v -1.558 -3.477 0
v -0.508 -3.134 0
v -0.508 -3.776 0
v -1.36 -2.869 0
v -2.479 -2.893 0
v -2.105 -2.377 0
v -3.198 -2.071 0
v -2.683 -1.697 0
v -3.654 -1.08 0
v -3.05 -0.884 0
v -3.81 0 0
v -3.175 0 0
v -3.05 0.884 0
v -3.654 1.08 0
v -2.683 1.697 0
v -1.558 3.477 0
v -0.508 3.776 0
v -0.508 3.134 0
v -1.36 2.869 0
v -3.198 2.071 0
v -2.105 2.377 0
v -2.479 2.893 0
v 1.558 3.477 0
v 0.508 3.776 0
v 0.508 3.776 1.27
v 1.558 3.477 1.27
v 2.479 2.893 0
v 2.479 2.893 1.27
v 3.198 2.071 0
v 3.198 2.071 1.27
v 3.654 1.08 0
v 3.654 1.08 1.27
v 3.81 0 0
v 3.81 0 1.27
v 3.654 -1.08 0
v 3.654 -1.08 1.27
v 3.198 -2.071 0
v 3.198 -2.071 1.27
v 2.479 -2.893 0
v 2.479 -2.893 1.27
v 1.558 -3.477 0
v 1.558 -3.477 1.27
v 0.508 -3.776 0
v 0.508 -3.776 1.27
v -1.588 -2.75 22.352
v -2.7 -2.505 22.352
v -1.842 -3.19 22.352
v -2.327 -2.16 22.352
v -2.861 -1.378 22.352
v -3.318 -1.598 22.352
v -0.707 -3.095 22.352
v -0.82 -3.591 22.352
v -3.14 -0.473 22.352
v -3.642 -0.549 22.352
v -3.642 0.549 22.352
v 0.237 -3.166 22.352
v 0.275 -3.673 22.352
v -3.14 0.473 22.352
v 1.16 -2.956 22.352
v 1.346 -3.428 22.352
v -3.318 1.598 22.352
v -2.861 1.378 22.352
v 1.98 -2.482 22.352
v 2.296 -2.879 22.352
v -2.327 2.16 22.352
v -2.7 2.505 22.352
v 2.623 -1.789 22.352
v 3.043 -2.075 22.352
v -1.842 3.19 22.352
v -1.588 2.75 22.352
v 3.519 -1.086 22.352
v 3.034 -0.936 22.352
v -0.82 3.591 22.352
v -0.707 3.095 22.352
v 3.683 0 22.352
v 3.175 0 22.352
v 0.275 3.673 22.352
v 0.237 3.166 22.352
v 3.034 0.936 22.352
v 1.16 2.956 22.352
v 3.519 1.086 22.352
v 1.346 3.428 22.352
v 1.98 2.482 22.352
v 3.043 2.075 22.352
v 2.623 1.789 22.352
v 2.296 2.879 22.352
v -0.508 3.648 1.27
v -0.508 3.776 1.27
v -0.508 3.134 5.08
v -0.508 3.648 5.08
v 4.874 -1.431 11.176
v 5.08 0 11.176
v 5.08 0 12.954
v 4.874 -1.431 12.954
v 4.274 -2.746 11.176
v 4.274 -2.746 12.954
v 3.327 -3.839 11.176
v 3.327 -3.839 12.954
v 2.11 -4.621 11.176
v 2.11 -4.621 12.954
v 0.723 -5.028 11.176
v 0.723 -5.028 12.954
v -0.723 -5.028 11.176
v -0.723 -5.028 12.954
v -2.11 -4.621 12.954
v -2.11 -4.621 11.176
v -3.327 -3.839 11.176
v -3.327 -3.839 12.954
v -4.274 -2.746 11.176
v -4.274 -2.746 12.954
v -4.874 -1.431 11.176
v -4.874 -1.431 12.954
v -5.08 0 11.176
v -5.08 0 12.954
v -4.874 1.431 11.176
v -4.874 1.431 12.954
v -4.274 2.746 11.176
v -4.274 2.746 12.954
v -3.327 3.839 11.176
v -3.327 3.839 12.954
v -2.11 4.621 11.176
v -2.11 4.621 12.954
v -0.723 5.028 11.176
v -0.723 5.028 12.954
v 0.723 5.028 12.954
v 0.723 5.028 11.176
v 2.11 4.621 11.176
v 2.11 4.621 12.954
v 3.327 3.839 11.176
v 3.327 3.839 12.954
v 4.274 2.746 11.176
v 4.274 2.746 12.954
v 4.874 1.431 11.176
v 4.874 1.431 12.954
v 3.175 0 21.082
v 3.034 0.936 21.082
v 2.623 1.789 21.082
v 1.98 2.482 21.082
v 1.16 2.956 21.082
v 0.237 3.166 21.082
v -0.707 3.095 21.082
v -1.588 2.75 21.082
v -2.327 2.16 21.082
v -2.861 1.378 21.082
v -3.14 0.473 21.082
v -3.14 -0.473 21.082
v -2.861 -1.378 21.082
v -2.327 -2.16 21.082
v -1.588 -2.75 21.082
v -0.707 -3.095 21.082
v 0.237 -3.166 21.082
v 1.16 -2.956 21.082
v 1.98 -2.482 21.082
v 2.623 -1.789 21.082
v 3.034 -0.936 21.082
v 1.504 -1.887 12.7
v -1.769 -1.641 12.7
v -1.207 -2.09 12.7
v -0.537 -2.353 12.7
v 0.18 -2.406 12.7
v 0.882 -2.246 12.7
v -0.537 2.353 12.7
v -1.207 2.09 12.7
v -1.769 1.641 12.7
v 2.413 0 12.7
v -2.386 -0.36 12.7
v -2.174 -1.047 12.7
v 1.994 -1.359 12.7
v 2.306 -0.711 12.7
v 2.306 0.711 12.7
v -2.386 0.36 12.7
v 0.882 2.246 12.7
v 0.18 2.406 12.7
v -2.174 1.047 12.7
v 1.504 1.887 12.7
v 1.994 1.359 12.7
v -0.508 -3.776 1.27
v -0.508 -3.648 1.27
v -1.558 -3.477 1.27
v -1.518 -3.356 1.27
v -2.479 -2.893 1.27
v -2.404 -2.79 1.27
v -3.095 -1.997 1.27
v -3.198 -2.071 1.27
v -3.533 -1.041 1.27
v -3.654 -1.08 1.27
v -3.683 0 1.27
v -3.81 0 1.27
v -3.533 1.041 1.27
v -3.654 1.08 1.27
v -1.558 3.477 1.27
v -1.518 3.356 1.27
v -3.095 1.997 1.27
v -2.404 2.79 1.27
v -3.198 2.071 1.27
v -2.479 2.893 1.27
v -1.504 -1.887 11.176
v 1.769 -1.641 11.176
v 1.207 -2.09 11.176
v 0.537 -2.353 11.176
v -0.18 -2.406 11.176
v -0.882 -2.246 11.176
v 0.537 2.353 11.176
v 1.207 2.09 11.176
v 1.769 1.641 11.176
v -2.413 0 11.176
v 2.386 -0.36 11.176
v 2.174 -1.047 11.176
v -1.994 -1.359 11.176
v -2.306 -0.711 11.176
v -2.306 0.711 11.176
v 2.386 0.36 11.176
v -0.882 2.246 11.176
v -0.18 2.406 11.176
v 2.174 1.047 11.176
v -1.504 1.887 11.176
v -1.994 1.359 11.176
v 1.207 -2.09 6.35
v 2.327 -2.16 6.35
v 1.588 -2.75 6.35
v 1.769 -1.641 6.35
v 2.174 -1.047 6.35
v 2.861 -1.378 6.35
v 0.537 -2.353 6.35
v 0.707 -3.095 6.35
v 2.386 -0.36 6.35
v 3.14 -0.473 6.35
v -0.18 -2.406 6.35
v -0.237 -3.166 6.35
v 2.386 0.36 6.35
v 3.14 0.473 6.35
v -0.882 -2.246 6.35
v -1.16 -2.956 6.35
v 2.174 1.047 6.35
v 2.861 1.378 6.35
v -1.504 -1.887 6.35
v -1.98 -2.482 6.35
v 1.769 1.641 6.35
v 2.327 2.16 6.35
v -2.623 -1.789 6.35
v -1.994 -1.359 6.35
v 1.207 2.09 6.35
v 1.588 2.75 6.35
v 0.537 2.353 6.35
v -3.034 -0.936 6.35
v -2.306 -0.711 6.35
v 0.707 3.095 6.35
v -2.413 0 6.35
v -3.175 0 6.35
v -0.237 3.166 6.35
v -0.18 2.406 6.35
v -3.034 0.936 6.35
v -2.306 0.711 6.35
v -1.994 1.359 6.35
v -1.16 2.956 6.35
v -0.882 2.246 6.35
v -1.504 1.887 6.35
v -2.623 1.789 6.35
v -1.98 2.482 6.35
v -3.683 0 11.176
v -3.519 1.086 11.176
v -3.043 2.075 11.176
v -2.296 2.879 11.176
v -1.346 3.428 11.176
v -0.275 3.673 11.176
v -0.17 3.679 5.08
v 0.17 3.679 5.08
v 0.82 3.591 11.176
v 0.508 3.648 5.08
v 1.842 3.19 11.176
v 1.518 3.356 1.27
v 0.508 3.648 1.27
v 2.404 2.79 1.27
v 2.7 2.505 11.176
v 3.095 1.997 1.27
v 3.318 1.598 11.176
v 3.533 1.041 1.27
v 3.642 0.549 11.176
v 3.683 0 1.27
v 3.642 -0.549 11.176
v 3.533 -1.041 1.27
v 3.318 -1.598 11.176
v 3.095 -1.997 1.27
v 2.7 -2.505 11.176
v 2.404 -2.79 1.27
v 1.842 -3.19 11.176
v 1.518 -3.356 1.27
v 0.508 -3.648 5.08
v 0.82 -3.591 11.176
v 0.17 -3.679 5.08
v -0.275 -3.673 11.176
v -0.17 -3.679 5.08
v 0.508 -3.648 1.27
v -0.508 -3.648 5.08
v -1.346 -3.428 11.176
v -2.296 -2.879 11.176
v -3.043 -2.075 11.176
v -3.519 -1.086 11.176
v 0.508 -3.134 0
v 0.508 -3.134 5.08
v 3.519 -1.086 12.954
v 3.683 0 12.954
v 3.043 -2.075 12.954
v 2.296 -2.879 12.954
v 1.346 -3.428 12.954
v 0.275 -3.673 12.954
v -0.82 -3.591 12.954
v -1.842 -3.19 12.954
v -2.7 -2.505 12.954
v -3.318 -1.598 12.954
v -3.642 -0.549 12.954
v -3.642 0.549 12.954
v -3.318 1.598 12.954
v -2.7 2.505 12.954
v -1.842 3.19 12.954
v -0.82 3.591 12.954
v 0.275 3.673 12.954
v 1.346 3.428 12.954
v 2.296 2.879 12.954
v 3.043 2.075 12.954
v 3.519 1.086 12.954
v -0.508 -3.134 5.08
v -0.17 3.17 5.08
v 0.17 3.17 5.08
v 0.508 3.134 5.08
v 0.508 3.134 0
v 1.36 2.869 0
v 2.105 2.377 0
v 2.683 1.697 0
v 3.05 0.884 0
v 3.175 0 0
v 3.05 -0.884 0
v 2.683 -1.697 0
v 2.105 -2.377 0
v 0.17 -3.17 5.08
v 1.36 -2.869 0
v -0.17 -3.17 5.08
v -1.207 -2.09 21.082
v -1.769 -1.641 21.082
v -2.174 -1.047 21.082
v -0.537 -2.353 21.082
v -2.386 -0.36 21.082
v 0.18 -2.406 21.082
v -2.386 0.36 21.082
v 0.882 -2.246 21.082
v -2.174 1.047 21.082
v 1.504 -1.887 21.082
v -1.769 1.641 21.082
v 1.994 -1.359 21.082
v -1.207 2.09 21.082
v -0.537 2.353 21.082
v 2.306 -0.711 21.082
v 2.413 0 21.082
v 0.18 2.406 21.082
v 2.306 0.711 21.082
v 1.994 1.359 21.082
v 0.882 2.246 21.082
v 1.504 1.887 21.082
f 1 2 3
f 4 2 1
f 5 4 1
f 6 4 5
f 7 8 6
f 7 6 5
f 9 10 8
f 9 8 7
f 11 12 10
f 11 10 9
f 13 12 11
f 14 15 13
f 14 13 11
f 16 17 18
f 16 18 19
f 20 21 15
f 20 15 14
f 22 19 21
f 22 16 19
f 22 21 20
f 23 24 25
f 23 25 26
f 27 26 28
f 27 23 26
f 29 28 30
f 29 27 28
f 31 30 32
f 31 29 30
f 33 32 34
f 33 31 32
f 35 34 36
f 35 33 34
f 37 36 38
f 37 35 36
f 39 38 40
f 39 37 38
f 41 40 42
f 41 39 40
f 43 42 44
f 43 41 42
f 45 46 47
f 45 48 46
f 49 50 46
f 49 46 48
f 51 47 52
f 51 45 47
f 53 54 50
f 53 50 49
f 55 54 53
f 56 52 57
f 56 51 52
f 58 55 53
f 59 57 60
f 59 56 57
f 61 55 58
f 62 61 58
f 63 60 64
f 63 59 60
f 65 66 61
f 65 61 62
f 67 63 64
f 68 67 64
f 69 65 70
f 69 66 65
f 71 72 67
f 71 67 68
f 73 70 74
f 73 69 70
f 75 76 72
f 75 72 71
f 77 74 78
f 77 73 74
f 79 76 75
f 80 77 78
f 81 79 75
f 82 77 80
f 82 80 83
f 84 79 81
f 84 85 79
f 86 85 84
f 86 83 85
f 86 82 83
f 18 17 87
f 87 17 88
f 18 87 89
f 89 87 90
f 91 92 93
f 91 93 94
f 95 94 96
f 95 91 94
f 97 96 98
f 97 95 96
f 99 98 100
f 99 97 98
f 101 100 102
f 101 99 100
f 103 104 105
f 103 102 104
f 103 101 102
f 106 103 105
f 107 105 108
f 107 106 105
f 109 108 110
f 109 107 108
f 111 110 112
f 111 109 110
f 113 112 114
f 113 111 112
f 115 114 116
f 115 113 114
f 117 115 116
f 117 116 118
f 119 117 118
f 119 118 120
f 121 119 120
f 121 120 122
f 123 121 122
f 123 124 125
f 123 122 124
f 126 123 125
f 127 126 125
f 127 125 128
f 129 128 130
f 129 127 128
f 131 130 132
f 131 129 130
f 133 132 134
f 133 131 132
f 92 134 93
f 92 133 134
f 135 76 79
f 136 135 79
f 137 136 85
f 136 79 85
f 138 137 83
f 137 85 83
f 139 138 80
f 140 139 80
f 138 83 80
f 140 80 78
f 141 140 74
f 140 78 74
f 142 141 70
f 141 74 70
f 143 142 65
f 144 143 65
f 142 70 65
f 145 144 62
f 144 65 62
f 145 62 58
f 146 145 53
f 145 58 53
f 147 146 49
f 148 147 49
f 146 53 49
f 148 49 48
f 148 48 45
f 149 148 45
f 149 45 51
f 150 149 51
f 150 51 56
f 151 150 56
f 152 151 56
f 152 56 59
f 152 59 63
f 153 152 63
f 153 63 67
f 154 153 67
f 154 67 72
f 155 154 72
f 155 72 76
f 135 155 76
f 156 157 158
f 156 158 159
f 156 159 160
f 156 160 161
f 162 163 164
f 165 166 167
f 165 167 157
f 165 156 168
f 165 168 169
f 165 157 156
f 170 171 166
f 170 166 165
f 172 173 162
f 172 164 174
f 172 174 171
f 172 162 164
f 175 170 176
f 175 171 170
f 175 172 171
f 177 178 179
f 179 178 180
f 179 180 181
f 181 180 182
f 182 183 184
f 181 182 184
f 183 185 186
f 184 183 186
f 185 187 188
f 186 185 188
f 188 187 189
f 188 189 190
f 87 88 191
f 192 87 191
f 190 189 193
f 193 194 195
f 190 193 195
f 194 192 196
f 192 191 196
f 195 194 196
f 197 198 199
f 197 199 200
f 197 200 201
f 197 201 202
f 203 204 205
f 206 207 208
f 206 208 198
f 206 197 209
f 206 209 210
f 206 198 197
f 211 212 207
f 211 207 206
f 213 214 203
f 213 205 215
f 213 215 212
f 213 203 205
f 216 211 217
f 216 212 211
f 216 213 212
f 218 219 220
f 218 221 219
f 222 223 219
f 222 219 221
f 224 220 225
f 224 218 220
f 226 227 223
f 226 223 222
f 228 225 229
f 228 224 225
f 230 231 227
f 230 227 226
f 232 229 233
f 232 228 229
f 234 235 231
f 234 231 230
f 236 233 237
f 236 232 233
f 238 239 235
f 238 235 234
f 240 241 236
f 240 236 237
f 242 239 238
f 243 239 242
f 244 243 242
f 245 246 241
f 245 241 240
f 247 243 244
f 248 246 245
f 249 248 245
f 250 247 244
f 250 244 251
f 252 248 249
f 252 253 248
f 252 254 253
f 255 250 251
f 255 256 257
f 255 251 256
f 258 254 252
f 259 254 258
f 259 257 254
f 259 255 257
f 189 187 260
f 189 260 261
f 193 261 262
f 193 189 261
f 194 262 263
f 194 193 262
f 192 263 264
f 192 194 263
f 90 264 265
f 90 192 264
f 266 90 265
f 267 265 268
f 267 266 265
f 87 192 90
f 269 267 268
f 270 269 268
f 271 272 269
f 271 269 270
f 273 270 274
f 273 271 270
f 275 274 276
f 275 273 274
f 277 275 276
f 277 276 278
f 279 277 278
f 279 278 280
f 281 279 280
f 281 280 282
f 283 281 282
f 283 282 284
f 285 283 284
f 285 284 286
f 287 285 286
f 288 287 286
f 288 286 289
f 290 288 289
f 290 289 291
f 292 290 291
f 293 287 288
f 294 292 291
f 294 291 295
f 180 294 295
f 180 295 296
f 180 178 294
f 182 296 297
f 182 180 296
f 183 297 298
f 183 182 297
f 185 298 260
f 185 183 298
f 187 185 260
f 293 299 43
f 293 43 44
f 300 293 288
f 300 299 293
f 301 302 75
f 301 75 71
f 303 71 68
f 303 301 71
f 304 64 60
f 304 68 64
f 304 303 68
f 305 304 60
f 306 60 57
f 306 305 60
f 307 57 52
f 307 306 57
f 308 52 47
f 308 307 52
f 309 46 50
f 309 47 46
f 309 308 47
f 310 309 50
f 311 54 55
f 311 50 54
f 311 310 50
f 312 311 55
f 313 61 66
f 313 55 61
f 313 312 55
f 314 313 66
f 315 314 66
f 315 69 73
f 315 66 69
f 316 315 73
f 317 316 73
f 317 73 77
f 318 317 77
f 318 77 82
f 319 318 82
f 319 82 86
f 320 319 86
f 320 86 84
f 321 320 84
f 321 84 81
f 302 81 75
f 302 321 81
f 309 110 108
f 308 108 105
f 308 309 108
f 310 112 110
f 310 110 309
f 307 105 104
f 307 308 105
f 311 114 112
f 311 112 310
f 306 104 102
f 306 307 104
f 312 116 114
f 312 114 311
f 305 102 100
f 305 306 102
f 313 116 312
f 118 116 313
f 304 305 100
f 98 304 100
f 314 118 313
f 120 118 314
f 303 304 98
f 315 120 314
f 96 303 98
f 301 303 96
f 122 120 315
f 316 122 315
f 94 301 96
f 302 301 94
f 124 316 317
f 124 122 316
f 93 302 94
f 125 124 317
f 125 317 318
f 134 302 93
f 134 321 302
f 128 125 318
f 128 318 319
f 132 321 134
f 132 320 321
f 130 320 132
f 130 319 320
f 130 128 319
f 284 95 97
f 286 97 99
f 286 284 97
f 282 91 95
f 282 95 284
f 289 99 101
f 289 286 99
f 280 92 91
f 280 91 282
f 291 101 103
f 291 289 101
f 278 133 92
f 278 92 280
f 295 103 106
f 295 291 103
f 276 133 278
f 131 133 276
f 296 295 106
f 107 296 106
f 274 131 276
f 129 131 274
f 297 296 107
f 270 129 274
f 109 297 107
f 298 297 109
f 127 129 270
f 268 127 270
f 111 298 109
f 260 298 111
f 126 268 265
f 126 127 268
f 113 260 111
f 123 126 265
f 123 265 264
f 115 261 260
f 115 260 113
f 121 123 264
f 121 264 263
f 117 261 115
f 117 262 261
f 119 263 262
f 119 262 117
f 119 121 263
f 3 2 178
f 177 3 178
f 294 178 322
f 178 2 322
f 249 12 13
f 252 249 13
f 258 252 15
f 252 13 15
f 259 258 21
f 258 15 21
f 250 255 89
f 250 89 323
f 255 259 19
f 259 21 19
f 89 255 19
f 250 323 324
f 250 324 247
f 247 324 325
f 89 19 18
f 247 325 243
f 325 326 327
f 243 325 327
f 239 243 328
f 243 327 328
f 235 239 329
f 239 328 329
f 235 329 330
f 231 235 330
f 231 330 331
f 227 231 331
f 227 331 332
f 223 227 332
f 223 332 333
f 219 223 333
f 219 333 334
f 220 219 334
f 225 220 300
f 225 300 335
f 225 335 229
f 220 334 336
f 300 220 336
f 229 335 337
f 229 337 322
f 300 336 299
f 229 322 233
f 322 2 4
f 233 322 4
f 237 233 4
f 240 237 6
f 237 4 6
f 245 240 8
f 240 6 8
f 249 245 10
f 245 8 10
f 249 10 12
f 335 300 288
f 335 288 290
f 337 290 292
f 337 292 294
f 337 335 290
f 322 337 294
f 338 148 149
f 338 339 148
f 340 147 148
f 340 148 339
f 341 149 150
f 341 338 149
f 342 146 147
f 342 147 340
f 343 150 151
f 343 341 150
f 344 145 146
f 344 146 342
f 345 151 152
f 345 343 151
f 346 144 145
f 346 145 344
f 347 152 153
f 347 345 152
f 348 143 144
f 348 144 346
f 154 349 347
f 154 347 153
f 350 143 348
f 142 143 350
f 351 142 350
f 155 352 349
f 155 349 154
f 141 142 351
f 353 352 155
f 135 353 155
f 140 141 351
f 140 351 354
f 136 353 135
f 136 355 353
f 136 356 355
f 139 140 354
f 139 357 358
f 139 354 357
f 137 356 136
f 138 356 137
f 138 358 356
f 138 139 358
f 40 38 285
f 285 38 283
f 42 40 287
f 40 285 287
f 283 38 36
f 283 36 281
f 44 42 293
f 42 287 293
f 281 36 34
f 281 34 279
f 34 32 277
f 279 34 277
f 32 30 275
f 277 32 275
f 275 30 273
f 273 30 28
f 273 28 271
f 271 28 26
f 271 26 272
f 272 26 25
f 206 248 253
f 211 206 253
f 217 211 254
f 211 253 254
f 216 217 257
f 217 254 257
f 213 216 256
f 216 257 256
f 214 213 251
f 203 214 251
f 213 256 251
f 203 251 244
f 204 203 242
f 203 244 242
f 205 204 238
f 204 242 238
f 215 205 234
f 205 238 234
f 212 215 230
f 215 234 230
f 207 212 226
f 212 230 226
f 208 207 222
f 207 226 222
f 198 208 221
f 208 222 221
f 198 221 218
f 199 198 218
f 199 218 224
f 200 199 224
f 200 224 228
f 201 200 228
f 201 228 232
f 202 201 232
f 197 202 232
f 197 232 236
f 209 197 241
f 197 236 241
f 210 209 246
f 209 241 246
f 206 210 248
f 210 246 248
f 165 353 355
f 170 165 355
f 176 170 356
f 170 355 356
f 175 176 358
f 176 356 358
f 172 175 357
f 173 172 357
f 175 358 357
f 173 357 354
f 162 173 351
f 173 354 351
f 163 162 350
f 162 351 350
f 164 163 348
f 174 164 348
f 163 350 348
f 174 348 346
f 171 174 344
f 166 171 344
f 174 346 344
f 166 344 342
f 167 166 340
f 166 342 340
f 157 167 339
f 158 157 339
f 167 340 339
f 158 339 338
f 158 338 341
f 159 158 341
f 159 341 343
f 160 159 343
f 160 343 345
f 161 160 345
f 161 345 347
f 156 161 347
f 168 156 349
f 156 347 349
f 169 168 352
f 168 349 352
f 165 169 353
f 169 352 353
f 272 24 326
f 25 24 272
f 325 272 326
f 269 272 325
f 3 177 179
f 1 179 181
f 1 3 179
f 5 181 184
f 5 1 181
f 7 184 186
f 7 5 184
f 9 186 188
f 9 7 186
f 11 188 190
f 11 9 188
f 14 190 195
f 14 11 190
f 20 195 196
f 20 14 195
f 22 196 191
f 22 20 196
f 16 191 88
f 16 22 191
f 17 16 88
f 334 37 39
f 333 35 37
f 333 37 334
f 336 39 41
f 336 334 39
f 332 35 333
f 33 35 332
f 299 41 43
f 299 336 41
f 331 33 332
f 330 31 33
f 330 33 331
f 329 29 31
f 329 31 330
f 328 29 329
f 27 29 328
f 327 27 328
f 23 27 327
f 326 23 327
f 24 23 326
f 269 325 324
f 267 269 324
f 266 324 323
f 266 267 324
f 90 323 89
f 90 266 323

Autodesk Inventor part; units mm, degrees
ref_plane "YZ Plane" through (0, 0, 0) normal (1, 0, 0) x (0, 1, 0)
ref_plane "XY Plane" through (0, 0, 0) normal (0, 0, 1) x (1, 0, 0)
sketch "Sketch1" plane through (0, 0, 0) normal (0, 0, 1) x (1, 0, 0)
  circle A0 centre (0, 0) radius 5.08
  dimension "d0" = 10.16
extrude "Extrusion1" add sketch "Sketch1" along normal blind 12.954
sketch "Sketch2" plane through (0, 0, 12.954) normal (0, 0, 1) x (1, 0, 0)
  circle A0 centre (0, 0) radius 3.683
  dimension "d3" = 7.366
extrude "Extrusion2" add sketch "Sketch2" along normal blind 9.398
sketch "Sketch4" plane through (0, 0, 22.352) normal (0, 0, 1) x (1, 0, 0)
  circle A0 centre (0, 0) radius 2.413
  dimension "d9" = 4.826
extrude "Extrusion3" cut sketch "Sketch4" against normal blind 9.652
sketch "Sketch5" plane through (0, 0, 22.352) normal (0, 0, 1) x (1, 0, 0)
  circle A0 centre (0, 0) radius 3.175
  dimension "d12" = 6.35
extrude "Extrusion4" cut sketch "Sketch5" against normal blind 1.27
sketch "Sketch6" plane through (0, 0, 0) normal (0, 0, -1) x (-1, 0, 0)
  circle A0 centre (0, 0) radius 2.413
  dimension "d15" = 4.826
extrude "Extrusion5" cut sketch "Sketch6" against normal blind 11.176
sketch "Sketch7" plane through (0, 0, 0) normal (0, 0, -1) x (-1, 0, 0)
  circle A0 centre (0, 0) radius 3.175
  dimension "d18" = 6.35
extrude "Extrusion6" cut sketch "Sketch7" against normal blind 6.35
sketch "Sketch8" plane through (0, 0, 0) normal (0, 0, -1) x (-1, 0, 0)
  circle A0 centre (0, 0) radius 3.683
  circle A1 centre (0, 0) radius 5.2614
  dimension "d21" = 7.366
extrude "Extrusion7" cut sketch "Sketch8" against normal blind 11.176
sketch "Sketch9" plane through (0, 0, 0) normal (0, 0, -1) x (-1, 0, 0)
  circle A0 centre (0, 0) radius 3.81
  dimension "d24" = 7.62
extrude "Extrusion8" add sketch "Sketch9" against normal blind 1.27
sketch "Sketch10" plane through (0, 0, 0) normal (0, 0, -1) x (-1, 0, 0)
  circle A0 centre (0, 0) radius 3.175
extrude "Extrusion9" cut sketch "Sketch10" against normal blind 1.27
ref_plane "Work Plane1" through (0, 5.08, 0) normal (0, 1, 0) x (-1, 0, 0)
sketch "Sketch13" plane through (0, 5.08, 0) normal (0, 1, 0) x (-1, 0, 0)
  line L0 (0, 0) -> (-0.508, 0)
  line L1 (-0.508, 0) -> (-0.508, 5.08)
  line L2 (-0.508, 5.08) -> (0, 5.08)
  line L3 (0, 5.08) -> (0, 0)
  line L4 (0, 0) -> (0.508, 0)
  line L5 (0.508, 0) -> (0.508, 5.08)
  line L6 (0.508, 5.08) -> (0, 5.08)
  line L7 (0, 5.08) -> (0, 0)
  dimension "d30" = 5.08
  dimension "d31" = 0.508
  dimension "d32" = 0.508
  dimension "d33" = 5.08
extrude "Extrusion10" cut sketch "Sketch13" against normal blind 10.16
properties part number "axle"
